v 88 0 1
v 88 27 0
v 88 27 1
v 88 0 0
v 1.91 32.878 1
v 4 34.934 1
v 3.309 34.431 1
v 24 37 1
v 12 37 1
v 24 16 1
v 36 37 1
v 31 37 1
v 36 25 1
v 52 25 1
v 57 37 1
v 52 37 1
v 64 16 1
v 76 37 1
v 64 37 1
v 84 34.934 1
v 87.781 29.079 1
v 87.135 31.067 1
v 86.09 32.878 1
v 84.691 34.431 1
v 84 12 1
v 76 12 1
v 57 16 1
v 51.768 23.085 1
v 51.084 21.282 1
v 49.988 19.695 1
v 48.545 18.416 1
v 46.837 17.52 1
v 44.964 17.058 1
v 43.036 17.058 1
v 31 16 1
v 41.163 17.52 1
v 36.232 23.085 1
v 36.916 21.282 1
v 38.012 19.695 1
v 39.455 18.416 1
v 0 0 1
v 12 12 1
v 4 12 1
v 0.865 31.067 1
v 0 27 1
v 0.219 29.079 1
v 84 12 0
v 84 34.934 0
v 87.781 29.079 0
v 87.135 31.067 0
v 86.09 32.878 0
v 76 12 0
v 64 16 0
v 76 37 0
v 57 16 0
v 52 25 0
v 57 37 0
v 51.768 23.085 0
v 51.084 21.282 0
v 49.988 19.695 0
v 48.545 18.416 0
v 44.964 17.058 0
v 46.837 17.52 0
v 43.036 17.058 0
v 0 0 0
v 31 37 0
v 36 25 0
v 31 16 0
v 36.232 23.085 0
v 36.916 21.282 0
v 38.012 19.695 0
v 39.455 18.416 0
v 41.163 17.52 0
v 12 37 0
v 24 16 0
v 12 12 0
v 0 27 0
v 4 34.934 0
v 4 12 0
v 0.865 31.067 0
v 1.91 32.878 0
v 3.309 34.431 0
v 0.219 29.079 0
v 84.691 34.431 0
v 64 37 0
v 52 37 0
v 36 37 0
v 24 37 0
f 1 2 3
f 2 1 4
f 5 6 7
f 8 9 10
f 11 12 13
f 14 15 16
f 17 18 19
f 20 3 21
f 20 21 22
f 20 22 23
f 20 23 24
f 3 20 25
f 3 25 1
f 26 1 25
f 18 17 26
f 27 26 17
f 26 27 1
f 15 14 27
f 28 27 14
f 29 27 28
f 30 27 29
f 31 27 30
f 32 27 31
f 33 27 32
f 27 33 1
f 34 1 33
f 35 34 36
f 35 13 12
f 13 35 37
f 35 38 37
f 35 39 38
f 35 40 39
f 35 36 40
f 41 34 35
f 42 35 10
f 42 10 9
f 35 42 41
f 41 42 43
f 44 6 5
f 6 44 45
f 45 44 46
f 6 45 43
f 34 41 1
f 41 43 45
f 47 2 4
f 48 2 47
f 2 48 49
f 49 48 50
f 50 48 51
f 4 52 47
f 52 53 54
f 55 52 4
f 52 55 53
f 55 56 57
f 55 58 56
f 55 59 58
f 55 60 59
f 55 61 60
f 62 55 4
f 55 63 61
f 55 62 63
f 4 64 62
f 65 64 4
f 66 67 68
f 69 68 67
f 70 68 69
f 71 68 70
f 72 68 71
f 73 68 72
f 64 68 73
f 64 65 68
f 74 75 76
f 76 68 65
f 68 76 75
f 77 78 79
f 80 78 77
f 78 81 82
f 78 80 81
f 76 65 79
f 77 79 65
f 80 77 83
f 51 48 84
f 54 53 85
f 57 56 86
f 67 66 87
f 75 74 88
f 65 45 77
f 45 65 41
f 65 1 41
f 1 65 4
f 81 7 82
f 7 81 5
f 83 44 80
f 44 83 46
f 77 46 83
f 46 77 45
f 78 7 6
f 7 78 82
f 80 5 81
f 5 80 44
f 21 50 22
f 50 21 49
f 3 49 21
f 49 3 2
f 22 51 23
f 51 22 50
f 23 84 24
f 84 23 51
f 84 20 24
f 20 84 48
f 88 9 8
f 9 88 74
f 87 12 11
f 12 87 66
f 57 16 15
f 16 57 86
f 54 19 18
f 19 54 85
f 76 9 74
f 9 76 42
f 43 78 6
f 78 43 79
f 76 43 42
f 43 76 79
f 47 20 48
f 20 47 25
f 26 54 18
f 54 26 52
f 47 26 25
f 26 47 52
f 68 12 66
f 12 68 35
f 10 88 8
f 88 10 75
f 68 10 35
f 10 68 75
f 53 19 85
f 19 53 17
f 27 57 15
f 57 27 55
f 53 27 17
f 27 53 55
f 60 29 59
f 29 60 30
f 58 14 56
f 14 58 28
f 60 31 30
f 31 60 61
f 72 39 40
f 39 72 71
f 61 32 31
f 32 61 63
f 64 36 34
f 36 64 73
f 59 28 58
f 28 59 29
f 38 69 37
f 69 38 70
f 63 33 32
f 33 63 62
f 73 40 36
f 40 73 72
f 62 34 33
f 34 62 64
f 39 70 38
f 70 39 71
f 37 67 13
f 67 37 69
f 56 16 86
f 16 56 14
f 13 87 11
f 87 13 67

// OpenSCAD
r = 10;


difference() {
  union() {
    cube([88, 37 - r, 1]);

    translate([r, 37-r, 0])
      cylinder(1, r, r);

    translate([88 - r, 37-r, 0])
      cylinder(1, r, r);

    translate([r, 0, 0])
      cube([88- 2 * r, 37, 1]);
  }
  
  translate([0, 0, -1]) {
    translate([4, 12, 0])
      cube([8, 37, 3]);
    
    translate([76, 12, 0])
      cube([8, 37, 3]);
    
    translate([24, 16, 0])
      cube([7, 37, 3]);
    
    translate([81 - 24, 16, 0])
      cube([7, 37, 3]);
    
    translate([44, 8 + 17, 0])
      cylinder(3, 8, 8);

    translate([36, 8 + 17, 0])
      cube([16, 16, 3]);

  }
}
